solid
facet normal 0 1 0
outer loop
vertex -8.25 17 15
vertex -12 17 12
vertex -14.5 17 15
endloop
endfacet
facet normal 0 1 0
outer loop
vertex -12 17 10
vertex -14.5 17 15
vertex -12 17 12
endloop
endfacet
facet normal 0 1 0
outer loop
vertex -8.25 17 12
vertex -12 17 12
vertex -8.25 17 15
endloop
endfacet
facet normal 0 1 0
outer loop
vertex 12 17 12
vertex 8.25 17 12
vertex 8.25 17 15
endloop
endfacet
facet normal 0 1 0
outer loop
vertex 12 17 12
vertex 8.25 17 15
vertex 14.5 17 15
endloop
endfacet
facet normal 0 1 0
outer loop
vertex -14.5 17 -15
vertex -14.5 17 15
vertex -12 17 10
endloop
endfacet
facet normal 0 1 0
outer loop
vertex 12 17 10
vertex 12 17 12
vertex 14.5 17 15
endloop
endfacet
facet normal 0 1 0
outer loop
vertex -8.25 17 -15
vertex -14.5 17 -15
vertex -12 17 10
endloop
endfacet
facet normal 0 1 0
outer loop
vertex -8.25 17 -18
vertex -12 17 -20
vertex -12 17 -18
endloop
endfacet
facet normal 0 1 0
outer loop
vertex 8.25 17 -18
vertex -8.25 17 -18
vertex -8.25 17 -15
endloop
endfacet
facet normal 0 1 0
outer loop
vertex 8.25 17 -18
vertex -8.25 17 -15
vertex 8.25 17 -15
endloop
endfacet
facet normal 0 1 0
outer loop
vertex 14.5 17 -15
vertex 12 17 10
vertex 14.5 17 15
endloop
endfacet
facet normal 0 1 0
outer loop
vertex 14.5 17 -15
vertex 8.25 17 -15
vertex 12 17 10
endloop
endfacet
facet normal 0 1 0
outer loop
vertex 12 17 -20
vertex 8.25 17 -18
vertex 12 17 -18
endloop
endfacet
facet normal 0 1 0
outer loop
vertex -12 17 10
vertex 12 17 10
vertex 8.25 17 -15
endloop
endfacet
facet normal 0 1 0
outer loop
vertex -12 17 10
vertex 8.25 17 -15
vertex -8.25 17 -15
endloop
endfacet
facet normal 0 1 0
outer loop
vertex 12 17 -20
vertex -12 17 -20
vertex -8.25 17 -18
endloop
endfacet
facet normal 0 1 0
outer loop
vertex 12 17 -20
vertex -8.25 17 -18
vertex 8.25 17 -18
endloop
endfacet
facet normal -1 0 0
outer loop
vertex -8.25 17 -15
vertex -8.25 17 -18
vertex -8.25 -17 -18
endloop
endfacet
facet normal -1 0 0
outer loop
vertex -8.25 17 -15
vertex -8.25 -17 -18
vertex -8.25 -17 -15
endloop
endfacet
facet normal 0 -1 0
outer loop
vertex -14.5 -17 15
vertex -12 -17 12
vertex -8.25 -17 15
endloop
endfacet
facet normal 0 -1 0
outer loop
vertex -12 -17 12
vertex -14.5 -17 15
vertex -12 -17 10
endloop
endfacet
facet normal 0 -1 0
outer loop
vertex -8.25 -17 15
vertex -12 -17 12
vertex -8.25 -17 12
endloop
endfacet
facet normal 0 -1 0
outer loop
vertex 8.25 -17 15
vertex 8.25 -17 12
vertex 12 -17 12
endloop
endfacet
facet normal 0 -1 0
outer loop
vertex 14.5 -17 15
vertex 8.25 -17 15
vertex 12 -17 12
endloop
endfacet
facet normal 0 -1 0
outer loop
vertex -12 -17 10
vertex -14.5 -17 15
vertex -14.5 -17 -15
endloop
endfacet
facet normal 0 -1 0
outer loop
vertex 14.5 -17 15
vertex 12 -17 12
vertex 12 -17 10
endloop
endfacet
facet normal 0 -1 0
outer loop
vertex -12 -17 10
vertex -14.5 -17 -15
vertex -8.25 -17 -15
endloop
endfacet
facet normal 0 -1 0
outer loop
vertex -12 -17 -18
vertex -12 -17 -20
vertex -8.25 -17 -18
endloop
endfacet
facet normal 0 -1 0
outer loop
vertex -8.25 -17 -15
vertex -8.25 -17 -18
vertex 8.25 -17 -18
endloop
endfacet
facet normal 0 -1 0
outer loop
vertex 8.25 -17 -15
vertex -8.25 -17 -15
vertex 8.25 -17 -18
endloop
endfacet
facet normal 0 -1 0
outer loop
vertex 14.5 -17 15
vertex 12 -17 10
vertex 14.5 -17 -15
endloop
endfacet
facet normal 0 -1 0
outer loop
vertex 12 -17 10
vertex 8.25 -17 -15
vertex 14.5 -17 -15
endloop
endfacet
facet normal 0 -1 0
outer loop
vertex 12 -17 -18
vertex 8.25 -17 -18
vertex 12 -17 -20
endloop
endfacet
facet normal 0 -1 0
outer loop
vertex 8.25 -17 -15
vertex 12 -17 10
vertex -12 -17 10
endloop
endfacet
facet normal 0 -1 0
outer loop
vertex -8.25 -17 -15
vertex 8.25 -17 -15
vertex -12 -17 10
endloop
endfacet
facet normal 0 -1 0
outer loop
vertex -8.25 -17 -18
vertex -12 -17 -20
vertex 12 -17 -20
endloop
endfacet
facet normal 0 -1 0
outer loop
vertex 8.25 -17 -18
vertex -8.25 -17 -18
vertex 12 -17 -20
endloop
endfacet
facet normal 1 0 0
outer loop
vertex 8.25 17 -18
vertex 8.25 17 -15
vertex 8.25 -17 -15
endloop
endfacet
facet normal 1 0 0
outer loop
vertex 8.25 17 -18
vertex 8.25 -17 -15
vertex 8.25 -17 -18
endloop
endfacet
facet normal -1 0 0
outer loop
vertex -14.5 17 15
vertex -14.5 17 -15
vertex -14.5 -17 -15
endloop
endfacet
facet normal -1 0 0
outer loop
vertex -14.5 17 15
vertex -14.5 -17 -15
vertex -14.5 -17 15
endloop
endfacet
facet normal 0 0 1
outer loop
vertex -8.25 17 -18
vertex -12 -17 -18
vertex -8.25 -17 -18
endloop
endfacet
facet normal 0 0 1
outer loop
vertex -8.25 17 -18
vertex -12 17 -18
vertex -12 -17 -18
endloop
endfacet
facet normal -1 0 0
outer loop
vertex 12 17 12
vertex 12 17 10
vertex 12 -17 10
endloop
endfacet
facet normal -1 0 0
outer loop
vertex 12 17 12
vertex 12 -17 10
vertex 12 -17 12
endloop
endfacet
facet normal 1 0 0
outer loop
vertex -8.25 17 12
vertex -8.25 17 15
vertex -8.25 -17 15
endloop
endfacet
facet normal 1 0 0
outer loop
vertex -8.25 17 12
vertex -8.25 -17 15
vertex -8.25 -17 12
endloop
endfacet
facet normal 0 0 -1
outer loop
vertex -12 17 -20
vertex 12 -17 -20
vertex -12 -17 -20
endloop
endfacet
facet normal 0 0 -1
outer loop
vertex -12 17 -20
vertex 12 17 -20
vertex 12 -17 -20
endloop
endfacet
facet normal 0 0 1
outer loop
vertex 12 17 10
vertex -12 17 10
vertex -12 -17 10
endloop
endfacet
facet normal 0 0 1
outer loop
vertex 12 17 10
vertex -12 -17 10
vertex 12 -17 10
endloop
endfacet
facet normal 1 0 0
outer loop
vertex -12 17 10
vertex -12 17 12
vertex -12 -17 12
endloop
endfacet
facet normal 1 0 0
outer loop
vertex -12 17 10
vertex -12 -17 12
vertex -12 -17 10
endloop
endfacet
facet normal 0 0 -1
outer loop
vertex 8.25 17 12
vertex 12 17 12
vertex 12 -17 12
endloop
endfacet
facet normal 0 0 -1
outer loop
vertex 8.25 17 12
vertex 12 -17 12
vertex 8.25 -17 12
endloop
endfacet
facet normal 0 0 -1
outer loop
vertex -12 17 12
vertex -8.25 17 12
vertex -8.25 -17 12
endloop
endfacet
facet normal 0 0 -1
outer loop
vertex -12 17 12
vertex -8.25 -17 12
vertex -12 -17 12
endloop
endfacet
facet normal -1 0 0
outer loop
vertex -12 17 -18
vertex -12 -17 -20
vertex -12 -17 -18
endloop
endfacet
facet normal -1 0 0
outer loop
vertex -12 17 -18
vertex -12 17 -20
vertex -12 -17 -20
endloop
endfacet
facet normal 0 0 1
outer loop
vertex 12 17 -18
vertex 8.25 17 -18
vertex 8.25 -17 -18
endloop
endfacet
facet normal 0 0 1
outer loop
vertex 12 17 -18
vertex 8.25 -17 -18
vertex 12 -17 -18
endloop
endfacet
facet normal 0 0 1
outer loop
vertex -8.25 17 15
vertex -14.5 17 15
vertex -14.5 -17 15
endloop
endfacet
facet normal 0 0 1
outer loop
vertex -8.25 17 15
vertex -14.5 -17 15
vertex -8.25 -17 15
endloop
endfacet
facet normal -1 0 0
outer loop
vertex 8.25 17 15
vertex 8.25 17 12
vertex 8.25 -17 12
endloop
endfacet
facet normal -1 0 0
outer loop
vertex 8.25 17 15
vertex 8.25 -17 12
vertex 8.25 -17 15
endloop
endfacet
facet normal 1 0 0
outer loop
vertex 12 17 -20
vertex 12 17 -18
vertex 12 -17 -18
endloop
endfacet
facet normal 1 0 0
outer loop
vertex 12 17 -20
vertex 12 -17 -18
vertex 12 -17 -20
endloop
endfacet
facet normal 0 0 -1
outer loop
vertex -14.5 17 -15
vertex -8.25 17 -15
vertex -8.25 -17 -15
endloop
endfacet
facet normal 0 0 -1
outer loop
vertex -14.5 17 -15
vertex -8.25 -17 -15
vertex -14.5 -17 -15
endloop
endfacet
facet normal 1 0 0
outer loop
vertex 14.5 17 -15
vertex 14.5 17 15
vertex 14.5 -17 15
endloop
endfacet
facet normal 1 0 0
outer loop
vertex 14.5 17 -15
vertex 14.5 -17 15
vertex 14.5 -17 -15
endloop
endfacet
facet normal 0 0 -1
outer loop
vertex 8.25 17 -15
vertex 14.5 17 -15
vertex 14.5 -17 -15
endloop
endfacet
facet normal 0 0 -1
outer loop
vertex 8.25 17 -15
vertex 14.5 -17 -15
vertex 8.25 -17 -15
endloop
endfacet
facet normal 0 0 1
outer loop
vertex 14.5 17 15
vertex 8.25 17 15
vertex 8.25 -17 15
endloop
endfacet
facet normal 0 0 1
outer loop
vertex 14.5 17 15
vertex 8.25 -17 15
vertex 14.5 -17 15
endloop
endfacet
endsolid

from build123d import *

# Parameters (mm, degrees)
BOSS_EXTRUDE1_DEPTH = 17


with BuildPart() as part:
    # Sketch1 → Boss-Extrude1 (new, symmetric)
    with BuildSketch(Plane(origin=(0, 0, 0), x_dir=(1, 0, 0), z_dir=(0, 1, 0))):
        Polygon((-12, 18), (-8.25, 18), (-8.25, 15), (-14.5, 15), (-14.5, -15), (-8.25, -15), (-8.25, -12), (-12, -12), (-12, -10), (12, -10), (12, -12), (8.25, -12), (8.25, -15), (14.5, -15), (14.5, 15), (8.25, 15), (8.25, 18), (12, 18), (12, 20), (-12, 20), align=None)
    extrude(amount=BOSS_EXTRUDE1_DEPTH, both=True)


solid = part.part
